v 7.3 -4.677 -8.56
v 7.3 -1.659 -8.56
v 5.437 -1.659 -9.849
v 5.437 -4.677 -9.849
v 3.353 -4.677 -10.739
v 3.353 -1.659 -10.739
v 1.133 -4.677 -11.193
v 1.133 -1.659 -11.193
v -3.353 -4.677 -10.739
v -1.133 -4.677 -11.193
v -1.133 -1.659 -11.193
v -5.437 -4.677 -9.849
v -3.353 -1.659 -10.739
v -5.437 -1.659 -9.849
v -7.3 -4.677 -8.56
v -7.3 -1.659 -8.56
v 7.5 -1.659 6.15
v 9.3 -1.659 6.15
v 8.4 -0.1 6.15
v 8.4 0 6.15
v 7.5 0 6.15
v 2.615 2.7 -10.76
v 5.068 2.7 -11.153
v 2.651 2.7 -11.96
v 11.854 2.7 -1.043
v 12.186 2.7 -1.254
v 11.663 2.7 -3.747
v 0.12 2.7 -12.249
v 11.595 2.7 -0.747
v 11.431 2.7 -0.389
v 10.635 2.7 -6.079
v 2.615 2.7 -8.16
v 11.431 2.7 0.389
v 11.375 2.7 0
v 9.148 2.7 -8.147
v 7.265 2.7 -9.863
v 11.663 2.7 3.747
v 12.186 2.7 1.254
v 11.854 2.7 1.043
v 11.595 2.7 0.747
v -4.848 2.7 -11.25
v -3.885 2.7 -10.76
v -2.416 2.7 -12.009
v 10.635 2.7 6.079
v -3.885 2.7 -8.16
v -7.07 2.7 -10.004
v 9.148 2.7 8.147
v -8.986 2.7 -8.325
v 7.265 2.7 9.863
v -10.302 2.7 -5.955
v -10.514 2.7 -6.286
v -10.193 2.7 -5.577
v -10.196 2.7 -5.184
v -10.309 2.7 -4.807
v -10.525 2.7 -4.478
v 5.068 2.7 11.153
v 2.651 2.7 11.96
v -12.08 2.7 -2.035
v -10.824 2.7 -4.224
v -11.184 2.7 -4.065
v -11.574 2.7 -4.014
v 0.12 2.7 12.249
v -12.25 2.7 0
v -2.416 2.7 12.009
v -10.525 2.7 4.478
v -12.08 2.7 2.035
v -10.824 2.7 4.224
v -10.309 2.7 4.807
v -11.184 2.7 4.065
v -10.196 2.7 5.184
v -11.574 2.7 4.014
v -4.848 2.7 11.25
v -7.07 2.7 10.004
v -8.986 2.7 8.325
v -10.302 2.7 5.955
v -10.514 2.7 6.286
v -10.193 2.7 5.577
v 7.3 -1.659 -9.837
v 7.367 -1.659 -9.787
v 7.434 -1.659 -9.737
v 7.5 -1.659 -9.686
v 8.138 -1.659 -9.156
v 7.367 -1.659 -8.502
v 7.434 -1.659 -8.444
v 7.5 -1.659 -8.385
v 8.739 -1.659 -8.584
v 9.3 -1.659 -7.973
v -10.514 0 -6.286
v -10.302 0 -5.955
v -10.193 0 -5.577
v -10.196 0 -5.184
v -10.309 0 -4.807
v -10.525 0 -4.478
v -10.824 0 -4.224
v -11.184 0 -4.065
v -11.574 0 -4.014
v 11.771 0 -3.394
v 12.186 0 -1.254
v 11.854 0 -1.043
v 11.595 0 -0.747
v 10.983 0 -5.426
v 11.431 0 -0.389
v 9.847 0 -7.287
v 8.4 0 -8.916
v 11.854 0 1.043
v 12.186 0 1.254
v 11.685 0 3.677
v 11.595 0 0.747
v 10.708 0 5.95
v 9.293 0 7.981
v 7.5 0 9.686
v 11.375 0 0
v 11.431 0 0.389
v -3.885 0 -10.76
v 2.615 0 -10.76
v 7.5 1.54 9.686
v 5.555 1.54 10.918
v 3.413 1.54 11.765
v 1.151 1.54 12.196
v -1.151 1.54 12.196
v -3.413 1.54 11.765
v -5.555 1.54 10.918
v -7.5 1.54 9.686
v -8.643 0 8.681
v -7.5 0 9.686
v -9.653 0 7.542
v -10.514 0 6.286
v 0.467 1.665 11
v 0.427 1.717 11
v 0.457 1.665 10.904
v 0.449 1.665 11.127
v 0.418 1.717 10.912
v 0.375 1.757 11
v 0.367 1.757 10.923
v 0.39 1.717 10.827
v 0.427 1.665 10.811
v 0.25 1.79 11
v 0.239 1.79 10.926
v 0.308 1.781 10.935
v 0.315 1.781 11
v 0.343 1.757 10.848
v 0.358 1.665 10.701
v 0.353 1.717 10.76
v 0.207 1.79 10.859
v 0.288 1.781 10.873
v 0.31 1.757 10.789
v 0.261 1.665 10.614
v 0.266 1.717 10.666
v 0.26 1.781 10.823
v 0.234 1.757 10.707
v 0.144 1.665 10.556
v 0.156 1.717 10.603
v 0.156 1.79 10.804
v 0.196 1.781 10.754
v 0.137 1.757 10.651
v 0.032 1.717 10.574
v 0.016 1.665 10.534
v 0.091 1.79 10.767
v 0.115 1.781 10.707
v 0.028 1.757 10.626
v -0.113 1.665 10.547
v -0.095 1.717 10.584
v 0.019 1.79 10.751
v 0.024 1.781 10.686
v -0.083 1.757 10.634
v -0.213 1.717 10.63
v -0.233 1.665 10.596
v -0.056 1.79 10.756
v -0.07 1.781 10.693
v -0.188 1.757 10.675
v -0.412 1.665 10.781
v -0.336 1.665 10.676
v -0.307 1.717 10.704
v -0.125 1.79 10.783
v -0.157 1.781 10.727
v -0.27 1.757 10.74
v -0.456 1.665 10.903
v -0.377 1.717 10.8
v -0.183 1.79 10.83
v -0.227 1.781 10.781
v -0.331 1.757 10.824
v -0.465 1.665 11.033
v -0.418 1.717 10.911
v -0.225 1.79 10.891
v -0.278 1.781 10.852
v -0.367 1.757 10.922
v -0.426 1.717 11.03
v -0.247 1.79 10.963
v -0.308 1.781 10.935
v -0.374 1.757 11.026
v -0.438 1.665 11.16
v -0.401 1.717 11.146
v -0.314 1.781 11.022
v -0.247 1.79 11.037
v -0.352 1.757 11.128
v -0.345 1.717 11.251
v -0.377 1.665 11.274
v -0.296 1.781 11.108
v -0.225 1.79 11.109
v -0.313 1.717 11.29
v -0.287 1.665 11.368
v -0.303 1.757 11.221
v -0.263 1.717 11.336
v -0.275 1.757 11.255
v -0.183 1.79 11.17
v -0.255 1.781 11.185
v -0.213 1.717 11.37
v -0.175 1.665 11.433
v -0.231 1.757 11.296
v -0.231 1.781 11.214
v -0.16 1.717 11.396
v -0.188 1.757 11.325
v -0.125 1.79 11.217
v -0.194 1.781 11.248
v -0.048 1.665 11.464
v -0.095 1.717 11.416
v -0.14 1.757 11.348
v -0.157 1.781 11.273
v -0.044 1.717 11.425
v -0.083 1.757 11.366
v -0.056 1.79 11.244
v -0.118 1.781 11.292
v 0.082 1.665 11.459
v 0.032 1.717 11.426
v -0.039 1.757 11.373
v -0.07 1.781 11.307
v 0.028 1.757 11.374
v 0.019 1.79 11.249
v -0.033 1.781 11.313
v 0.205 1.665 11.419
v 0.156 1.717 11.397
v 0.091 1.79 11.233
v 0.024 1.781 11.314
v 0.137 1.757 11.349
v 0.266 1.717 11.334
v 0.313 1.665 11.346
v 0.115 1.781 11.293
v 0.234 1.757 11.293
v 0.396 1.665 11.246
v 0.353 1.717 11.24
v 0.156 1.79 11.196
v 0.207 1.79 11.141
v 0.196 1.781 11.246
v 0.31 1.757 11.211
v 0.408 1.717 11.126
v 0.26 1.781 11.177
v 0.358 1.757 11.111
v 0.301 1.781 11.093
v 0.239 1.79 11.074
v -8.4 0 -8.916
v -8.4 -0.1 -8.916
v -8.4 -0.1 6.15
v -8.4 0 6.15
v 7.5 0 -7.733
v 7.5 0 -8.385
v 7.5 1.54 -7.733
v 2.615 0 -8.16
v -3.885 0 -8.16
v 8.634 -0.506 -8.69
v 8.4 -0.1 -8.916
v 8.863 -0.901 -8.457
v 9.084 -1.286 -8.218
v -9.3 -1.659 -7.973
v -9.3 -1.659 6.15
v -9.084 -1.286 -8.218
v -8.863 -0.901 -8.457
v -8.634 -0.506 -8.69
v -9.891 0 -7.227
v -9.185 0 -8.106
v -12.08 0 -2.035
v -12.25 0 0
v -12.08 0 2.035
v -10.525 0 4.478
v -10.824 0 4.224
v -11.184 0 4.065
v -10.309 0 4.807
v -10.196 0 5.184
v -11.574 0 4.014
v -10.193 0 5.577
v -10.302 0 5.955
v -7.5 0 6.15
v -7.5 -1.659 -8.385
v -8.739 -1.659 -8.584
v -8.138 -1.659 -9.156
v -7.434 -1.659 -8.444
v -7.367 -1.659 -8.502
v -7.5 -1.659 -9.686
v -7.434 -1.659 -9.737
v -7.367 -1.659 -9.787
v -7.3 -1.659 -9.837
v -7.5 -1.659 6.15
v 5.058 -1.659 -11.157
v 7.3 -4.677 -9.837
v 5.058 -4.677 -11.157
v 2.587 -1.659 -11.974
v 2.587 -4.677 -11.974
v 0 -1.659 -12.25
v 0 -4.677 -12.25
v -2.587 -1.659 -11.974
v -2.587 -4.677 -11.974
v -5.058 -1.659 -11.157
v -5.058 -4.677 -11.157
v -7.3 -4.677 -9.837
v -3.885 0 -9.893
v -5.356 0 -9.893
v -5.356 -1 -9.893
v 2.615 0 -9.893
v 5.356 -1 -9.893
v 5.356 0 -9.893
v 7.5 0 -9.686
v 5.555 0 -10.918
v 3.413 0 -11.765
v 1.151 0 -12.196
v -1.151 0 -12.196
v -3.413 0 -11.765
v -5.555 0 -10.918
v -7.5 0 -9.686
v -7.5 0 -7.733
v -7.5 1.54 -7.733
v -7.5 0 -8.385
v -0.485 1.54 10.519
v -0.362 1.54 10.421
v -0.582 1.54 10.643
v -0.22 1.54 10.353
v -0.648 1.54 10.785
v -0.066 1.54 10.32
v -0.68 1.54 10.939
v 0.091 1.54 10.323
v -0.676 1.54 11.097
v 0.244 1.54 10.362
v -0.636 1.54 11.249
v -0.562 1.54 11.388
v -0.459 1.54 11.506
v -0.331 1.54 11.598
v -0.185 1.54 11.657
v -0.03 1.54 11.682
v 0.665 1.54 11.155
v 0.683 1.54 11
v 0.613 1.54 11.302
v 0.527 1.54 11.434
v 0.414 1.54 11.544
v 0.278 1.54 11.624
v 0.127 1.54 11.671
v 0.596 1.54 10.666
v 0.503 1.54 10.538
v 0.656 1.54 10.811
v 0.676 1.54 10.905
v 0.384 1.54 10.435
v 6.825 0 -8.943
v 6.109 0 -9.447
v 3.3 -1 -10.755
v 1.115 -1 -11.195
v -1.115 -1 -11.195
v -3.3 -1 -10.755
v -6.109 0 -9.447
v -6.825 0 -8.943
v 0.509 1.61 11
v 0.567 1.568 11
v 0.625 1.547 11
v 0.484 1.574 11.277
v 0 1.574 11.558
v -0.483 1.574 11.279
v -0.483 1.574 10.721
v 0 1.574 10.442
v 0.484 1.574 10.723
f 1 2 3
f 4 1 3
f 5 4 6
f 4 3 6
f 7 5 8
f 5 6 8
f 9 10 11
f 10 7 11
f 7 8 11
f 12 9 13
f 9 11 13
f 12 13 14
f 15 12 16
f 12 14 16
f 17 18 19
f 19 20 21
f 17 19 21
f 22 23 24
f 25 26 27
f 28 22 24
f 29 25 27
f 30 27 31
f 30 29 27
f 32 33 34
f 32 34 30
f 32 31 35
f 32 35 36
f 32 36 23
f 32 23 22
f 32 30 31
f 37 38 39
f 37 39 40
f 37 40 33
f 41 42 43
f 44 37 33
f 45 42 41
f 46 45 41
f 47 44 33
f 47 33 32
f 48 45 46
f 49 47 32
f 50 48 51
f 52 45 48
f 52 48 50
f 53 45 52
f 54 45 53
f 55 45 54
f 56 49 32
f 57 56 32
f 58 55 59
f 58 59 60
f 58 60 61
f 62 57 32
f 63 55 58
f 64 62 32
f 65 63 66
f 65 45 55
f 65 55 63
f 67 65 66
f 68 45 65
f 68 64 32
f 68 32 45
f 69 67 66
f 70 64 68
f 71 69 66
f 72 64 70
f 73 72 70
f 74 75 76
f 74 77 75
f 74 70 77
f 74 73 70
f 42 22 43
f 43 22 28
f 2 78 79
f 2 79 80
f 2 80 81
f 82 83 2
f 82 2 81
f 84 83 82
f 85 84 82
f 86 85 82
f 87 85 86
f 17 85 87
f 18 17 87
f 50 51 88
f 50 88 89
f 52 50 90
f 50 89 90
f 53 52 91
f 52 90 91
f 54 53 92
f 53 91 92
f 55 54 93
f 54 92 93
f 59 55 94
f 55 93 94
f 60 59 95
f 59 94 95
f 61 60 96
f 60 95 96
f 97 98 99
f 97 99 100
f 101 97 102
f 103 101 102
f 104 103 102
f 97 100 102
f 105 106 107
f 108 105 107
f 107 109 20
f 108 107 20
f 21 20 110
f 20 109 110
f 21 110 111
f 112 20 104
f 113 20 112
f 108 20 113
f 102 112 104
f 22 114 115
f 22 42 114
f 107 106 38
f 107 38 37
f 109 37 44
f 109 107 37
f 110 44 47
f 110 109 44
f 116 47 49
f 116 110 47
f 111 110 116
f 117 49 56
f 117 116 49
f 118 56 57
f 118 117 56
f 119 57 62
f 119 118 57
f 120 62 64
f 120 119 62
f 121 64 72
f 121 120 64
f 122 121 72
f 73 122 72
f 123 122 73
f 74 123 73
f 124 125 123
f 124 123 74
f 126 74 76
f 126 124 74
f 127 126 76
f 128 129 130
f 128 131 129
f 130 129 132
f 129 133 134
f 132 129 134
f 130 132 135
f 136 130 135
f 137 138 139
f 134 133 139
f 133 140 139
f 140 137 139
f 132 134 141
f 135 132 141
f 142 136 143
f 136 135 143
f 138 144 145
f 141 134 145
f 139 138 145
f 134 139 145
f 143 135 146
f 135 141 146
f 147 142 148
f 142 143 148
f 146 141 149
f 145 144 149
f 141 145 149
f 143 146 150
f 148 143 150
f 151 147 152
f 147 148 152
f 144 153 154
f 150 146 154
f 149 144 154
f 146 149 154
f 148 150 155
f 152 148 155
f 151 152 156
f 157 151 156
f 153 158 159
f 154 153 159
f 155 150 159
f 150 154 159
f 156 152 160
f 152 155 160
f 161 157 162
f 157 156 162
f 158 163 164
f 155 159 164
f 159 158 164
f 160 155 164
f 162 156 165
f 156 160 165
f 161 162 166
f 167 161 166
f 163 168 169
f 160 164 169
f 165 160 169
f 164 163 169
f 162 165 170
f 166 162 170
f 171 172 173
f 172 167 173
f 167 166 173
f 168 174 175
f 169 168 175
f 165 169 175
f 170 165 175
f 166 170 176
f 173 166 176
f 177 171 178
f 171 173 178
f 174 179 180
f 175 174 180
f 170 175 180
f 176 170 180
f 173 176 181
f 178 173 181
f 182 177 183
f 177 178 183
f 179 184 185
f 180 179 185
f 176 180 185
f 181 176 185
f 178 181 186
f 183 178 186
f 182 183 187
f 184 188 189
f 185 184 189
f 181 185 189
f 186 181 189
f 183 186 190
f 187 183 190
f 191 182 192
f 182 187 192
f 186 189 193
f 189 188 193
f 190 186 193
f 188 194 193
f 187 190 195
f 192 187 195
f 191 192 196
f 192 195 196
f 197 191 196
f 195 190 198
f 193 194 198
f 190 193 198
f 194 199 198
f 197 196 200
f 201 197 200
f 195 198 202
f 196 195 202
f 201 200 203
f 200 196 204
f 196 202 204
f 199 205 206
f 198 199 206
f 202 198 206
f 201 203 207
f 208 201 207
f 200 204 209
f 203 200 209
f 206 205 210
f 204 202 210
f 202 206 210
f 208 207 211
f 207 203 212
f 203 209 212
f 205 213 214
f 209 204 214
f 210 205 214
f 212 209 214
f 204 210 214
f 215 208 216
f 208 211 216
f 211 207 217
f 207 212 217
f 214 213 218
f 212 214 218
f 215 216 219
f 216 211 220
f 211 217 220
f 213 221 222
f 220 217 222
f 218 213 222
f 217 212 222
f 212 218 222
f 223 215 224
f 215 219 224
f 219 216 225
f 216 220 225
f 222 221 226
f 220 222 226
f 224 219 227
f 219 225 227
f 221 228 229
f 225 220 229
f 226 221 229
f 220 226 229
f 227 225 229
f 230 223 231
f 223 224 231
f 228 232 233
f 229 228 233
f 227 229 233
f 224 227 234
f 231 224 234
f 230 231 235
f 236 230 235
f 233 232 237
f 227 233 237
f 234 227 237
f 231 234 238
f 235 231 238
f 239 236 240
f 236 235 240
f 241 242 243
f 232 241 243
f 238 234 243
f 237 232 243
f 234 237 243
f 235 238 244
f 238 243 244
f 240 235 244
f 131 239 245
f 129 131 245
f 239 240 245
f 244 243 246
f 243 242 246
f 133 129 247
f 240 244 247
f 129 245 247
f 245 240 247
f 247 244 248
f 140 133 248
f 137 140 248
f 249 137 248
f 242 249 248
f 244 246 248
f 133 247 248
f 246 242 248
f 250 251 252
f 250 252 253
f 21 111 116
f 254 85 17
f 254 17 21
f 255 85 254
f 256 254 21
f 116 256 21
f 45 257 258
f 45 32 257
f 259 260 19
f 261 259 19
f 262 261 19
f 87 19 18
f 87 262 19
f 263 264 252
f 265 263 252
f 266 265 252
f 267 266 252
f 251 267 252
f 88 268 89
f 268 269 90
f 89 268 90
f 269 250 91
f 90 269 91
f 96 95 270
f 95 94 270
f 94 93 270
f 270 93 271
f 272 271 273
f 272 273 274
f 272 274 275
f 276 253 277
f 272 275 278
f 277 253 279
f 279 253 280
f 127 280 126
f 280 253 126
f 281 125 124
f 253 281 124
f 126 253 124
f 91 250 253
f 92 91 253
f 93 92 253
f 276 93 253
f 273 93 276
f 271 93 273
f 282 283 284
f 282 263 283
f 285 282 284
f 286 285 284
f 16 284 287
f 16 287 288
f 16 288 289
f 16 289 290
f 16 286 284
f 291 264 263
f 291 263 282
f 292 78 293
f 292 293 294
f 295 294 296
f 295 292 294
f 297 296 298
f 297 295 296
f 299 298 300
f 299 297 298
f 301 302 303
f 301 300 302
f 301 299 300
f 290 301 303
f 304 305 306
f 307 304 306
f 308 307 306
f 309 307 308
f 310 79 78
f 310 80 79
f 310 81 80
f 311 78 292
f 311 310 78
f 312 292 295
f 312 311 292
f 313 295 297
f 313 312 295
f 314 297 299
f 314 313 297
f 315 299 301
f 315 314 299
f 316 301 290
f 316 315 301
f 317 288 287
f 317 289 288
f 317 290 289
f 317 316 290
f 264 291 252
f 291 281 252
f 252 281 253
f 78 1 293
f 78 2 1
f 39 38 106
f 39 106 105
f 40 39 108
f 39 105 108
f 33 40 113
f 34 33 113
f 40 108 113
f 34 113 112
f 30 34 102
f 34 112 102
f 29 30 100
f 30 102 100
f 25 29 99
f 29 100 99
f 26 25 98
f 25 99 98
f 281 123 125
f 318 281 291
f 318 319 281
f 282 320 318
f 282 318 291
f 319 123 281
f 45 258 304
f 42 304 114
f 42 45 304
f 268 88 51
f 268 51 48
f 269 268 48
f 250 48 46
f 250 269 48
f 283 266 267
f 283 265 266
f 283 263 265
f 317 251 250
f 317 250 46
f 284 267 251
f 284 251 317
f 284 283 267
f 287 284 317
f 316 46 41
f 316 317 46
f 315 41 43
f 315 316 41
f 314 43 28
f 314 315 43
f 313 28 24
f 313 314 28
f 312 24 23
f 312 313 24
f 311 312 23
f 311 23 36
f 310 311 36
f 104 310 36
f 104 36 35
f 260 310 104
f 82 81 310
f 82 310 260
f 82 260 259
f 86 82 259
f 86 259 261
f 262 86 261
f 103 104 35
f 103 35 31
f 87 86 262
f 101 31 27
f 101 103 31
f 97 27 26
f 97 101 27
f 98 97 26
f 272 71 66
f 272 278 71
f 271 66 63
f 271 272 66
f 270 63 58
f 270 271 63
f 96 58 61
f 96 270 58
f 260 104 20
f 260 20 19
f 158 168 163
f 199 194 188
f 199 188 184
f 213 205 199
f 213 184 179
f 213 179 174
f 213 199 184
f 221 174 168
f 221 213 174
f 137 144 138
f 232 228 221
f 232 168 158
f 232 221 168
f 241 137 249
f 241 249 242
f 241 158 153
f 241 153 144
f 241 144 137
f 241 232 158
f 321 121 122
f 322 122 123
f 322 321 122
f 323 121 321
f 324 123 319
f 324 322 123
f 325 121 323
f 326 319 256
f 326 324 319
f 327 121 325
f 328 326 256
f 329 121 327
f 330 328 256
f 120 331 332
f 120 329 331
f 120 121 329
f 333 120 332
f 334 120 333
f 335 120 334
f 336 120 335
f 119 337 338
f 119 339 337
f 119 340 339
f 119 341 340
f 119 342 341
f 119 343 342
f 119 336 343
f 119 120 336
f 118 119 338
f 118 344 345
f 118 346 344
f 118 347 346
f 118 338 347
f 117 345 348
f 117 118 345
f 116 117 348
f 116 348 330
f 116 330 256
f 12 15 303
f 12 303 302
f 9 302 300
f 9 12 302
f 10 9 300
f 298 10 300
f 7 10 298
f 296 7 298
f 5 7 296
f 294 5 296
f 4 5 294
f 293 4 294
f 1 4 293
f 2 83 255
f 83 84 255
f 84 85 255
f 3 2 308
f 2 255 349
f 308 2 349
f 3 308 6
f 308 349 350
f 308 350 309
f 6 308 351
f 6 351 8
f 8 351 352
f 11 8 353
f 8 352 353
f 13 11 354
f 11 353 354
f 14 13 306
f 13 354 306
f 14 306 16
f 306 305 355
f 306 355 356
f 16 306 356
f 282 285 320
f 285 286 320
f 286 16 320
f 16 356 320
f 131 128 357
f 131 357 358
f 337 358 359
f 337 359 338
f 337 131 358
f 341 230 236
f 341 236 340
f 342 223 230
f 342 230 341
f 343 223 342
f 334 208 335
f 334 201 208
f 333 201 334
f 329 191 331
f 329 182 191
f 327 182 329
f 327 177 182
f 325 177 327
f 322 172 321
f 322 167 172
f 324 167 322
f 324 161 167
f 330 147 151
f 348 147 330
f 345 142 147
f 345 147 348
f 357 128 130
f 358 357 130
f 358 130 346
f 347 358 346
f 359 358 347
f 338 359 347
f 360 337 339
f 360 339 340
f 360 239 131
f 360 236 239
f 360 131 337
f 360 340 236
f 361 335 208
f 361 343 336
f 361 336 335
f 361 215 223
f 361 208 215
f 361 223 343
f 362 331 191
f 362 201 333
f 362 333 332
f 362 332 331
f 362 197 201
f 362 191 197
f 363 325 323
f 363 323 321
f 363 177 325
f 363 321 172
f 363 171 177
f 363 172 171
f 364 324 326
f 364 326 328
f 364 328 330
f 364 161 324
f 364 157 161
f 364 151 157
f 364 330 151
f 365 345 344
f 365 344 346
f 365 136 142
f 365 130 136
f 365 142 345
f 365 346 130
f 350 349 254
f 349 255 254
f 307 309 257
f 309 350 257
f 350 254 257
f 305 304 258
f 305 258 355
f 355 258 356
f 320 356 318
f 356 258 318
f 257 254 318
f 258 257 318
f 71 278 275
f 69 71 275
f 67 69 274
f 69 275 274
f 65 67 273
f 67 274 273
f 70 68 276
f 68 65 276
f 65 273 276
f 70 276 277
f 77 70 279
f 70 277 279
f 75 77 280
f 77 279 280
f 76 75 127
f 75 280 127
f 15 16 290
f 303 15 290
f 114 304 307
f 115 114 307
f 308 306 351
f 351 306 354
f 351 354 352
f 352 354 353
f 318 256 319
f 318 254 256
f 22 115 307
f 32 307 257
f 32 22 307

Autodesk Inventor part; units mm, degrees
ref_plane "YZ Plane" through (0, 0, 0) normal (1, 0, 0) x (0, 1, 0)
ref_plane "XZ Plane" through (0, 0, 0) normal (0, 1, 0) x (-1, 0, 0)
ref_plane "XY Plane" through (0, 0, 0) normal (0, 0, 1) x (1, 0, 0)
sketch "Sketch10" plane through (0, 0, 0) normal (0, 1, 0) x (-1, 0, 0)
  circle A0 centre (0, 0) radius 12.25
  dimension "d115" = 24.5
extrude "Extrusion8" add sketch "Sketch10" along normal blind 2.7
sketch "Sketch15" plane through (0, 0, 0) normal (0, -1, 0) x (1, 0, 0)
  circle A0 centre (0, 0) radius 12.75 construction
  line L0 (12.75, 0) -> (0, 0) construction
  line L1 (0, 0) -> (-11.5554, -5.3884) construction
  line L2 (0, 0) -> (-11.5554, 5.3884) construction
  circle A1 centre (-11.5554, -5.3884) radius 1.375
  circle A2 centre (12.75, 0) radius 1.375
  circle A3 centre (-11.5554, 5.3884) radius 1.375
  dimension "d116" = 25.5
  dimension "d117" = 25
  dimension "d118" = 25
  dimension "d119" = 2.75
extrude "Extrusion13" cut sketch "Sketch15" against normal up to surface (2.7 mm away)
sketch "Sketch17" plane through (0, 2.7, 0) normal (0, 1, 0) x (1, 0, 0)
  line L0 (-3.885, 10.76) -> (2.615, 10.76)
  line L1 (2.615, 10.76) -> (2.615, 8.16)
  line L2 (2.615, 8.16) -> (-3.885, 8.16)
  line L3 (-3.885, 8.16) -> (-3.885, 10.76)
  line L4 (2.615, 8.16) -> (-3.885, 10.76) construction
  line L5 (-3.885, 8.16) -> (2.615, 10.76) construction
  point P0 (0, 0)
  point P1 (-0.635, 9.46)
  dimension "d130" = 2.6
  dimension "d131" = 6.5
  dimension "d144" = 9.46
  dimension "d145" = 0.635
extrude "Extrusion14" cut sketch "Sketch17" against normal up to next
sketch "Sketch11" plane through (0, 0, 0) normal (0, -1, 0) x (1, 0, 0)
  line L0 (7.5, -7.7326) -> (-7.5, -7.7326)
  line L1 (-7.5, -7.7326) -> (-7.5, 12.25)
  line L2 (-7.5, 12.25) -> (7.5, 12.25)
  line L3 (7.5, 12.25) -> (7.5, -7.7326)
  arc A0 (12.1857, 1.2539) -> (12.1857, -1.2539) centre (12.75, 0) ccw projected
  arc A1 (-10.5141, -6.2863) -> (12.1857, -1.2539) centre (0, 0) ccw projected
  arc A2 (-10.5141, -6.2863) -> (-11.5739, -4.0135) centre (-11.5554, -5.3884) ccw projected
  arc A3 (-11.5739, 4.0135) -> (-11.5739, -4.0135) centre (0, 0) ccw projected
  arc A4 (-11.5739, 4.0135) -> (-10.5141, 6.2863) centre (-11.5554, 5.3884) ccw projected
  arc A5 (12.1857, 1.2539) -> (-10.5141, 6.2863) centre (0, 0) ccw projected
  dimension "d78" = 15
  dimension "d122" = 7.5
extrude "Extrusion9" cut sketch "Sketch11" against normal blind 1.54 contours L0 L1 A5 L3 | A5 L2 L3 | L1 L2 A5
ref_plane "Work Plane4" through (0, 0, -12.25) normal (0, 0, -1) x (-1, 0, 0)
ref_plane "Work Plane3" through (0, 0, -7.7326) normal (-1, 0, 0) x (0, 0, 1)
sketch "Sketch13" plane through (0, 0, -12.25) normal (0, 0, -1) x (-1, 0, 0)
  line L0 (-7.5, 1.54) -> (-7.5, 0) projected
  line L1 (-12.1857, 0) -> (-7.5, 0) projected
  line L2 (-12.1857, 0) -> (-12.1857, 2.7) projected
  line L3 (10.5141, 2.7) -> (-12.1857, 2.7) projected
  line L4 (10.5141, 2.7) -> (10.5141, 0) projected
  line L5 (7.5, 0) -> (10.5141, 0) projected
  line L6 (7.5, 0) -> (7.5, 1.54) projected
  line L7 (7.5, 1.54) -> (-7.5, 1.54) projected
  line L8 (7.5, 0) -> (7.5, -1.6588)
  line L9 (7.5, -1.6588) -> (9.3, -1.6588)
  line L10 (9.3, -1.6588) -> (8.4, -0.1)
  line L11 (8.4, -0.1) -> (8.4, 0)
  line L12 (7.5, 0) -> (8.4, 0)
  line L13 (7.5, 0) -> (10.5141, 0) projected
  point P0 (0, 15)
  dimension "d146" = 0.9
  dimension "d147" = 60
  dimension "d148" = 1.8
  dimension "d149" = 0.1
extrude "Extrusion11" add sketch "Sketch13" against normal blind 18.4 contours L5 L11 L10 L9 L8
mirror "Mirror1" about plane through (0, 0, -7.7326) normal (-1, 0, 0) of "Extrusion11"
sketch "Sketch14" plane through (0, 0, 0) normal (0, -1, 0) x (1, 0, 0)
  circle A0 centre (0, 0) radius 12.25
  arc A1 (7.5, 9.6857) -> (-7.5, 9.6857) centre (0, 0) ccw projected
  circle A2 centre (0, 0) radius 24.8523
  point P0 (1.5155, -12.4)
extrude "Extrusion12" cut sketch "Sketch14" along normal up to next
sketch "Sketch19" plane through (0, 0, 0) normal (0, -1, 0) x (1, 0, 0)
  arc A0 (-7.5, -8.3853) -> (7.5, -8.3853) centre (0, 0) ccw
  arc A1 (-7.5, -9.6857) -> (7.5, -9.6857) centre (0, 0) ccw projected
  line L0 (-7.5, -9.6857) -> (-7.5, 6.15) projected
  line L1 (7.5, -9.6857) -> (7.5, 6.15) projected
  point P0 (-7.5, -9.8747)
  point P1 (7.5, -9.8747)
  point P2 (-7.5, -9.7488)
  point P3 (7.5, -9.7488)
  dimension "d141" = 1
extrude "Extrusion15" add sketch "Sketch19" along normal up to surface (1.6588 mm away)
sketch "Sketch21" plane through (0, 1.54, 0) normal (0, -1, 0) x (1, 0, 0)
  circle A0 centre (0, 11) radius 0.5
  point P0 (0, 0)
  dimension "d154" = 11
  dimension "d155" = 1
extrude "Extrusion17" cut sketch "Sketch21" against normal blind 0.25
fillet "Fillet1" radius 0.25 2 edges at (-0.5, 1.79, 11) (-0.5, 1.54, 11)
sketch "Sketch22" plane through (0, -1.6588, 0) normal (0, -1, 0) x (1, 0, 0)
  arc A0 (-7.3, -9.8373) -> (7.3, -9.8373) centre (0, 0) ccw
  arc A1 (-7.3, -8.5599) -> (7.3, -8.5599) centre (0, 0) ccw
  line L0 (-7.3, -8.5599) -> (-7.3, -9.8373)
  line L1 (7.3, -8.5599) -> (7.3, -9.8373)
  arc A2 (-9.3, -7.9732) -> (-7.5, -9.6857) centre (0, 0) ccw projected
  arc A3 (-7.5, -9.6857) -> (7.5, -9.6857) centre (0, 0) ccw projected
  arc A4 (7.5, -9.6857) -> (9.3, -7.9732) centre (0, 0) ccw projected
  line L2 (9.3, -7.9732) -> (9.3, 6.15) projected
  line L3 (9.3, 6.15) -> (7.5, 6.15) projected
  line L4 (7.5, -8.3853) -> (7.5, 6.15) projected
  arc A5 (-7.5, -8.3853) -> (7.5, -8.3853) centre (0, 0) ccw projected
  line L5 (-7.5, -8.3853) -> (-7.5, 6.15) projected
  line L6 (-9.3, 6.15) -> (-7.5, 6.15) projected
  line L7 (-9.3, -7.9732) -> (-9.3, 6.15) projected
  arc A6 (-7.5, -8.3853) -> (7.5, -8.3853) centre (0, 0) ccw projected
  arc A7 (7.5, -9.6857) -> (9.3, -7.9732) centre (0, 0) ccw projected
  dimension "d163" = 0.2
  dimension "d164" = 0.2
extrude "Extrusion18" add sketch "Sketch22" along normal blind 3.018 contours L0 A1 L1 A0
sketch "Sketch23" plane through (0, 0, 0) normal (0, -1, 0) x (1, 0, 0)
  arc A0 (-7.3, -8.5599) -> (7.3, -8.5599) centre (0, 0) ccw projected
  line L0 (-5.3558, -9.8933) -> (5.3558, -9.8933)
  line L1 (2.615, -10.76) -> (-3.284, -10.76) projected
  line L2 (-3.885, -8.16) -> (2.615, -8.16) projected
  dimension "d165" = 0.8667
  dimension "d166" = 2.6
extrude "Extrusion19" add sketch "Sketch23" along normal blind 1
properties part number "bottom2_2" material "Acrylic"
